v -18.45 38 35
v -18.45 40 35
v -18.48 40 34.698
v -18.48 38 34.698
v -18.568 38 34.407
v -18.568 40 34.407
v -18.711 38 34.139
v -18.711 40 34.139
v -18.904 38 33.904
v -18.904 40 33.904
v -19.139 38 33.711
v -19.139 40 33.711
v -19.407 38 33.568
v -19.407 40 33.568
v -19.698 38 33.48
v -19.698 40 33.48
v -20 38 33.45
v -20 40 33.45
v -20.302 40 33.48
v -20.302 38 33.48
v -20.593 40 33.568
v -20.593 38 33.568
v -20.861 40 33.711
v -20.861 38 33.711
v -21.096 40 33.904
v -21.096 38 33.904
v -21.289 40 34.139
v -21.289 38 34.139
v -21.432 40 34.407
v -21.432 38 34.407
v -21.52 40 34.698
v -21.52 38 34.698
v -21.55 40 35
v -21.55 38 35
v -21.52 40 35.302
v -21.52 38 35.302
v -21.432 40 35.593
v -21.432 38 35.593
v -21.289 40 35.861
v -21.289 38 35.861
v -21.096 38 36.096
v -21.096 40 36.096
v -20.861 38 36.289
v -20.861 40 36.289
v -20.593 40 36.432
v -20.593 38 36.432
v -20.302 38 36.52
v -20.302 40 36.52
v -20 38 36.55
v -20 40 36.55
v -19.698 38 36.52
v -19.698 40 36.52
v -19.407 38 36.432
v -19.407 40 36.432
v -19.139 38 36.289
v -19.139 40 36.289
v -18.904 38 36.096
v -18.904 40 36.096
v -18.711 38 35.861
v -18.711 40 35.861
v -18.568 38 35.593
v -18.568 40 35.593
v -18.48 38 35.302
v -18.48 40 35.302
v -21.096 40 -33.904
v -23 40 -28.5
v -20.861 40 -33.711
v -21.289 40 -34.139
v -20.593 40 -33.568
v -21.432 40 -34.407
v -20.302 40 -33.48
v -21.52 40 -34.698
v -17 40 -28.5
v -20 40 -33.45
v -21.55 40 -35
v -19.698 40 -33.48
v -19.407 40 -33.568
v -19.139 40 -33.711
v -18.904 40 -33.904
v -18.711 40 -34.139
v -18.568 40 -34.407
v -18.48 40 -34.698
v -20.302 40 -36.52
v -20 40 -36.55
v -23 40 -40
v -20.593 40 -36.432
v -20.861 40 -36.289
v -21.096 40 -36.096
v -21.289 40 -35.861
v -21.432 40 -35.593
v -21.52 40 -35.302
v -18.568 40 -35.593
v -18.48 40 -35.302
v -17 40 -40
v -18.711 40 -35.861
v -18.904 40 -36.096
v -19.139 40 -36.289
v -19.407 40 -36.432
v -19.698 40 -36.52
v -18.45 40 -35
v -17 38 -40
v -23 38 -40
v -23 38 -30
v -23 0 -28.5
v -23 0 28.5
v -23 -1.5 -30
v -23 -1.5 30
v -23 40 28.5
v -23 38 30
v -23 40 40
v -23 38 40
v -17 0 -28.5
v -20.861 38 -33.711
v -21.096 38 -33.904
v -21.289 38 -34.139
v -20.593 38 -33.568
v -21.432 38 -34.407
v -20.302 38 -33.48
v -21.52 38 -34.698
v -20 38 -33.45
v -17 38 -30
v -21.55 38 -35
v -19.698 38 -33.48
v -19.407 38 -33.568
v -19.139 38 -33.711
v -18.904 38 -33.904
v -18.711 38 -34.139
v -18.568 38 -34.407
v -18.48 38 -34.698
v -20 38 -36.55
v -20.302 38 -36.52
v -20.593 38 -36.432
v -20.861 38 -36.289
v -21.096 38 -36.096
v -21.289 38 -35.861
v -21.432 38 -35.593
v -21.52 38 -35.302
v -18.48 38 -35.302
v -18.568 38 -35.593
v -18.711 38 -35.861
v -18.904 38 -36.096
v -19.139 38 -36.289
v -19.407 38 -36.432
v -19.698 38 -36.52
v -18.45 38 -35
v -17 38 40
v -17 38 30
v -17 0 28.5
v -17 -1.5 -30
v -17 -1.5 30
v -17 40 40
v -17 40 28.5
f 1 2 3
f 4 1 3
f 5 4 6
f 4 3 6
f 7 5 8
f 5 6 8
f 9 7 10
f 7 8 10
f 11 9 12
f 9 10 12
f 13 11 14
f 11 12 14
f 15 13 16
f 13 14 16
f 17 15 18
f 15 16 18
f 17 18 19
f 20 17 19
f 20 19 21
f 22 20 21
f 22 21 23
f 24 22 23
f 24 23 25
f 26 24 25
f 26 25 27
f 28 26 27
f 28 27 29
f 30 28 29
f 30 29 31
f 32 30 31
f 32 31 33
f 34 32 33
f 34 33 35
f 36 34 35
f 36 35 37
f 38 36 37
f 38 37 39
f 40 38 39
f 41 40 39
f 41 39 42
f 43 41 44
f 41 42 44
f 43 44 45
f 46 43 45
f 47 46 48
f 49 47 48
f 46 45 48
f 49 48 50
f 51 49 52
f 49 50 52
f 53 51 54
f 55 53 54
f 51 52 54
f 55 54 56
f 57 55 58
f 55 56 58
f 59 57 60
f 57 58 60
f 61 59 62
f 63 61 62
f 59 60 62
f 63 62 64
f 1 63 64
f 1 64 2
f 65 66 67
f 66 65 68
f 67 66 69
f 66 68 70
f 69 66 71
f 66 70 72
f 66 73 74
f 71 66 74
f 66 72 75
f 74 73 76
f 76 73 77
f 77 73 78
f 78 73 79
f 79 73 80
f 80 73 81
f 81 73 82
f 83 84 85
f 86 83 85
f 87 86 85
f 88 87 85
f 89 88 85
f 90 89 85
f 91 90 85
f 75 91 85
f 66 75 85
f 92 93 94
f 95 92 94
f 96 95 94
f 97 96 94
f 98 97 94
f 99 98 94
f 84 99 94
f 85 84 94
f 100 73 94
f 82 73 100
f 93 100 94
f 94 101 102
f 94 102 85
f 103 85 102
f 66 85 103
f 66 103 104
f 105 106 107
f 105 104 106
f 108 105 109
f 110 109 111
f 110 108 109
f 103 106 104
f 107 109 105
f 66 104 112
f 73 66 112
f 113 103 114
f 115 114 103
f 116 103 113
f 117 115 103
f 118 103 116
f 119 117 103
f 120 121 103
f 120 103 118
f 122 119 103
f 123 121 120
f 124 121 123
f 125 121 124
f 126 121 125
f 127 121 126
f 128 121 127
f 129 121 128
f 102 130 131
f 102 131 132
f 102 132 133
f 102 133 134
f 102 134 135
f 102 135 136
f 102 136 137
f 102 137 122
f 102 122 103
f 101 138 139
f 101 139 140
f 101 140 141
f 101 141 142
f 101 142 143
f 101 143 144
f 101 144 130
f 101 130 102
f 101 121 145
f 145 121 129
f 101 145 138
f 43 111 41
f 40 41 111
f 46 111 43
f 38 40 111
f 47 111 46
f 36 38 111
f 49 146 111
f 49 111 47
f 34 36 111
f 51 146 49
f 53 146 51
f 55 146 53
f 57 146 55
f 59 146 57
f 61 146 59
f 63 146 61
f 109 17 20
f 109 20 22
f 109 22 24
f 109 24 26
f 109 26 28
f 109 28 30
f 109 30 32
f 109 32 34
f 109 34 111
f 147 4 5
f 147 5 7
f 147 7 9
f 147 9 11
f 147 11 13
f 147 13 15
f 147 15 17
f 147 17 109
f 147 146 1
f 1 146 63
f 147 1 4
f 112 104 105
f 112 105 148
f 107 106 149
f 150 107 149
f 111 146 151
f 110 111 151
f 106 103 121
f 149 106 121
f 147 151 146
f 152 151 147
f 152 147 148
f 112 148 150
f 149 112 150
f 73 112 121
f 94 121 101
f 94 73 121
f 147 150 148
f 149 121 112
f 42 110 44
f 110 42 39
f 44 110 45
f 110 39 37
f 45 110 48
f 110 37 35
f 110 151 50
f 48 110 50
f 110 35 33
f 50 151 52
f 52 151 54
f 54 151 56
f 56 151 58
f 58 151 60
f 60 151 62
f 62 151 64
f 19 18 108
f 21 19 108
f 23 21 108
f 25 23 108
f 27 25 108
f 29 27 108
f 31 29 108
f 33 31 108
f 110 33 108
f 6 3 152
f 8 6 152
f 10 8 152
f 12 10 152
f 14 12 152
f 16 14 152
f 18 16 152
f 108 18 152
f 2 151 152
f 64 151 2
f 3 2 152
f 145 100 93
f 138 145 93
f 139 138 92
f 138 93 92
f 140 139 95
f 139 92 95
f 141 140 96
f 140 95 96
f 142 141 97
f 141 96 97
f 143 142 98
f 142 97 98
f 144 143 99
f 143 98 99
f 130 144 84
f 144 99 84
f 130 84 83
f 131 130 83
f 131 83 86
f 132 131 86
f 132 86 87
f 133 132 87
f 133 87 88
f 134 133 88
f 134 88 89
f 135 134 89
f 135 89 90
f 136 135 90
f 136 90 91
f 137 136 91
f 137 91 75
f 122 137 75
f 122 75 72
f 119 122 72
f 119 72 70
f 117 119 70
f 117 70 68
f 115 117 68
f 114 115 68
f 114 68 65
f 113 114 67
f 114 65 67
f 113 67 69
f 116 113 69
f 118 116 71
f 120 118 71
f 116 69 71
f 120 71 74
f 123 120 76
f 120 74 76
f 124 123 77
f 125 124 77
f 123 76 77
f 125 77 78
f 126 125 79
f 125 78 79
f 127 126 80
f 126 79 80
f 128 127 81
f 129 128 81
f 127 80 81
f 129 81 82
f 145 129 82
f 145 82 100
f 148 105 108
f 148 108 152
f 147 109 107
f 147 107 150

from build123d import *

# Parameters (mm, degrees)
SKETCH1_W           = 50
SKETCH1_H           = 60
SKETCH1_W_2         = 47
SKETCH1_H_2         = 57
BOSS_EXTRUDE6_DEPTH = 40
SKETCH7_W           = 50
SKETCH7_H           = 60
BOSS_EXTRUDE8_DEPTH = 1.5
SKETCH8_W           = 10
SKETCH8_H           = 2
BOSS_EXTRUDE9_DEPTH = 50
SKETCH9_R           = 1.55
CUT_EXTRUDE1_DEPTH  = 3
SKETCH11_R          = 8.25
CUT_EXTRUDE3_DEPTH  = 1.5
SKETCH12_W          = 80
SKETCH12_H          = 42.428758989
CUT_EXTRUDE4_DEPTH  = 2
SKETCH13_W          = 92.772924303
SKETCH13_H          = 57.399075468
CUT_EXTRUDE5_DEPTH  = 42


with BuildPart() as part:
    # Sketch1 → Boss-Extrude6 (new body)
    with BuildSketch(Plane(origin=(0, 0, 0), x_dir=(1, 0, 0), z_dir=(0, 1, 0))):
        Rectangle(SKETCH1_W, SKETCH1_H)
        Rectangle(SKETCH1_W_2, SKETCH1_H_2, mode=Mode.SUBTRACT)
    extrude(amount=BOSS_EXTRUDE6_DEPTH)

    # Sketch7 → Boss-Extrude8 (add)
    with BuildSketch(Plane.XZ):
        Rectangle(SKETCH7_W, SKETCH7_H)
    extrude(amount=BOSS_EXTRUDE8_DEPTH)

    # Sketch8 → Boss-Extrude9 (add)
    with BuildSketch(Plane(origin=(25, 0, 0), x_dir=(0, 0, -1), z_dir=(1, 0, 0))):
        with Locations((-35, 39)):
            Rectangle(SKETCH8_W, SKETCH8_H)
        with Locations((35, 39)):
            Rectangle(SKETCH8_W, SKETCH8_H)
    extrude(amount=-BOSS_EXTRUDE9_DEPTH)

    # Sketch9 → Cut-Extrude1 (cut)
    with BuildSketch(Plane(origin=(0, 40, 0), x_dir=(1, 0, 0), z_dir=(0, 1, 0))):
        with Locations((-20, 35)):
            Circle(SKETCH9_R)
        with Locations((20, 35)):
            Circle(SKETCH9_R)
        with Locations((20, -35)):
            Circle(SKETCH9_R)
        with Locations((-20, -35)):
            Circle(SKETCH9_R)
    extrude(amount=-CUT_EXTRUDE1_DEPTH, mode=Mode.SUBTRACT)

    # Sketch11 → Cut-Extrude3 (cut)
    with BuildSketch(Plane.ZY.offset(25)):
        with Locations((0, 18.25)):
            Circle(SKETCH11_R)
    extrude(amount=-CUT_EXTRUDE3_DEPTH, mode=Mode.SUBTRACT)

    # Sketch12 → Cut-Extrude4 (cut)
    with BuildSketch(Plane.ZY.offset(25)):
        with Locations((0, 18.785620505)):
            Rectangle(SKETCH12_W, SKETCH12_H)
    extrude(amount=-CUT_EXTRUDE4_DEPTH, mode=Mode.SUBTRACT)

    # Sketch13 → Cut-Extrude5 (cut)
    with BuildSketch(Plane(origin=(25, 0, 0), x_dir=(0, 0, -1), z_dir=(1, 0, 0))):
        with Locations((0.049381319, 17.016100398)):
            Rectangle(SKETCH13_W, SKETCH13_H)
    extrude(amount=-CUT_EXTRUDE5_DEPTH, mode=Mode.SUBTRACT)


solid = part.part
